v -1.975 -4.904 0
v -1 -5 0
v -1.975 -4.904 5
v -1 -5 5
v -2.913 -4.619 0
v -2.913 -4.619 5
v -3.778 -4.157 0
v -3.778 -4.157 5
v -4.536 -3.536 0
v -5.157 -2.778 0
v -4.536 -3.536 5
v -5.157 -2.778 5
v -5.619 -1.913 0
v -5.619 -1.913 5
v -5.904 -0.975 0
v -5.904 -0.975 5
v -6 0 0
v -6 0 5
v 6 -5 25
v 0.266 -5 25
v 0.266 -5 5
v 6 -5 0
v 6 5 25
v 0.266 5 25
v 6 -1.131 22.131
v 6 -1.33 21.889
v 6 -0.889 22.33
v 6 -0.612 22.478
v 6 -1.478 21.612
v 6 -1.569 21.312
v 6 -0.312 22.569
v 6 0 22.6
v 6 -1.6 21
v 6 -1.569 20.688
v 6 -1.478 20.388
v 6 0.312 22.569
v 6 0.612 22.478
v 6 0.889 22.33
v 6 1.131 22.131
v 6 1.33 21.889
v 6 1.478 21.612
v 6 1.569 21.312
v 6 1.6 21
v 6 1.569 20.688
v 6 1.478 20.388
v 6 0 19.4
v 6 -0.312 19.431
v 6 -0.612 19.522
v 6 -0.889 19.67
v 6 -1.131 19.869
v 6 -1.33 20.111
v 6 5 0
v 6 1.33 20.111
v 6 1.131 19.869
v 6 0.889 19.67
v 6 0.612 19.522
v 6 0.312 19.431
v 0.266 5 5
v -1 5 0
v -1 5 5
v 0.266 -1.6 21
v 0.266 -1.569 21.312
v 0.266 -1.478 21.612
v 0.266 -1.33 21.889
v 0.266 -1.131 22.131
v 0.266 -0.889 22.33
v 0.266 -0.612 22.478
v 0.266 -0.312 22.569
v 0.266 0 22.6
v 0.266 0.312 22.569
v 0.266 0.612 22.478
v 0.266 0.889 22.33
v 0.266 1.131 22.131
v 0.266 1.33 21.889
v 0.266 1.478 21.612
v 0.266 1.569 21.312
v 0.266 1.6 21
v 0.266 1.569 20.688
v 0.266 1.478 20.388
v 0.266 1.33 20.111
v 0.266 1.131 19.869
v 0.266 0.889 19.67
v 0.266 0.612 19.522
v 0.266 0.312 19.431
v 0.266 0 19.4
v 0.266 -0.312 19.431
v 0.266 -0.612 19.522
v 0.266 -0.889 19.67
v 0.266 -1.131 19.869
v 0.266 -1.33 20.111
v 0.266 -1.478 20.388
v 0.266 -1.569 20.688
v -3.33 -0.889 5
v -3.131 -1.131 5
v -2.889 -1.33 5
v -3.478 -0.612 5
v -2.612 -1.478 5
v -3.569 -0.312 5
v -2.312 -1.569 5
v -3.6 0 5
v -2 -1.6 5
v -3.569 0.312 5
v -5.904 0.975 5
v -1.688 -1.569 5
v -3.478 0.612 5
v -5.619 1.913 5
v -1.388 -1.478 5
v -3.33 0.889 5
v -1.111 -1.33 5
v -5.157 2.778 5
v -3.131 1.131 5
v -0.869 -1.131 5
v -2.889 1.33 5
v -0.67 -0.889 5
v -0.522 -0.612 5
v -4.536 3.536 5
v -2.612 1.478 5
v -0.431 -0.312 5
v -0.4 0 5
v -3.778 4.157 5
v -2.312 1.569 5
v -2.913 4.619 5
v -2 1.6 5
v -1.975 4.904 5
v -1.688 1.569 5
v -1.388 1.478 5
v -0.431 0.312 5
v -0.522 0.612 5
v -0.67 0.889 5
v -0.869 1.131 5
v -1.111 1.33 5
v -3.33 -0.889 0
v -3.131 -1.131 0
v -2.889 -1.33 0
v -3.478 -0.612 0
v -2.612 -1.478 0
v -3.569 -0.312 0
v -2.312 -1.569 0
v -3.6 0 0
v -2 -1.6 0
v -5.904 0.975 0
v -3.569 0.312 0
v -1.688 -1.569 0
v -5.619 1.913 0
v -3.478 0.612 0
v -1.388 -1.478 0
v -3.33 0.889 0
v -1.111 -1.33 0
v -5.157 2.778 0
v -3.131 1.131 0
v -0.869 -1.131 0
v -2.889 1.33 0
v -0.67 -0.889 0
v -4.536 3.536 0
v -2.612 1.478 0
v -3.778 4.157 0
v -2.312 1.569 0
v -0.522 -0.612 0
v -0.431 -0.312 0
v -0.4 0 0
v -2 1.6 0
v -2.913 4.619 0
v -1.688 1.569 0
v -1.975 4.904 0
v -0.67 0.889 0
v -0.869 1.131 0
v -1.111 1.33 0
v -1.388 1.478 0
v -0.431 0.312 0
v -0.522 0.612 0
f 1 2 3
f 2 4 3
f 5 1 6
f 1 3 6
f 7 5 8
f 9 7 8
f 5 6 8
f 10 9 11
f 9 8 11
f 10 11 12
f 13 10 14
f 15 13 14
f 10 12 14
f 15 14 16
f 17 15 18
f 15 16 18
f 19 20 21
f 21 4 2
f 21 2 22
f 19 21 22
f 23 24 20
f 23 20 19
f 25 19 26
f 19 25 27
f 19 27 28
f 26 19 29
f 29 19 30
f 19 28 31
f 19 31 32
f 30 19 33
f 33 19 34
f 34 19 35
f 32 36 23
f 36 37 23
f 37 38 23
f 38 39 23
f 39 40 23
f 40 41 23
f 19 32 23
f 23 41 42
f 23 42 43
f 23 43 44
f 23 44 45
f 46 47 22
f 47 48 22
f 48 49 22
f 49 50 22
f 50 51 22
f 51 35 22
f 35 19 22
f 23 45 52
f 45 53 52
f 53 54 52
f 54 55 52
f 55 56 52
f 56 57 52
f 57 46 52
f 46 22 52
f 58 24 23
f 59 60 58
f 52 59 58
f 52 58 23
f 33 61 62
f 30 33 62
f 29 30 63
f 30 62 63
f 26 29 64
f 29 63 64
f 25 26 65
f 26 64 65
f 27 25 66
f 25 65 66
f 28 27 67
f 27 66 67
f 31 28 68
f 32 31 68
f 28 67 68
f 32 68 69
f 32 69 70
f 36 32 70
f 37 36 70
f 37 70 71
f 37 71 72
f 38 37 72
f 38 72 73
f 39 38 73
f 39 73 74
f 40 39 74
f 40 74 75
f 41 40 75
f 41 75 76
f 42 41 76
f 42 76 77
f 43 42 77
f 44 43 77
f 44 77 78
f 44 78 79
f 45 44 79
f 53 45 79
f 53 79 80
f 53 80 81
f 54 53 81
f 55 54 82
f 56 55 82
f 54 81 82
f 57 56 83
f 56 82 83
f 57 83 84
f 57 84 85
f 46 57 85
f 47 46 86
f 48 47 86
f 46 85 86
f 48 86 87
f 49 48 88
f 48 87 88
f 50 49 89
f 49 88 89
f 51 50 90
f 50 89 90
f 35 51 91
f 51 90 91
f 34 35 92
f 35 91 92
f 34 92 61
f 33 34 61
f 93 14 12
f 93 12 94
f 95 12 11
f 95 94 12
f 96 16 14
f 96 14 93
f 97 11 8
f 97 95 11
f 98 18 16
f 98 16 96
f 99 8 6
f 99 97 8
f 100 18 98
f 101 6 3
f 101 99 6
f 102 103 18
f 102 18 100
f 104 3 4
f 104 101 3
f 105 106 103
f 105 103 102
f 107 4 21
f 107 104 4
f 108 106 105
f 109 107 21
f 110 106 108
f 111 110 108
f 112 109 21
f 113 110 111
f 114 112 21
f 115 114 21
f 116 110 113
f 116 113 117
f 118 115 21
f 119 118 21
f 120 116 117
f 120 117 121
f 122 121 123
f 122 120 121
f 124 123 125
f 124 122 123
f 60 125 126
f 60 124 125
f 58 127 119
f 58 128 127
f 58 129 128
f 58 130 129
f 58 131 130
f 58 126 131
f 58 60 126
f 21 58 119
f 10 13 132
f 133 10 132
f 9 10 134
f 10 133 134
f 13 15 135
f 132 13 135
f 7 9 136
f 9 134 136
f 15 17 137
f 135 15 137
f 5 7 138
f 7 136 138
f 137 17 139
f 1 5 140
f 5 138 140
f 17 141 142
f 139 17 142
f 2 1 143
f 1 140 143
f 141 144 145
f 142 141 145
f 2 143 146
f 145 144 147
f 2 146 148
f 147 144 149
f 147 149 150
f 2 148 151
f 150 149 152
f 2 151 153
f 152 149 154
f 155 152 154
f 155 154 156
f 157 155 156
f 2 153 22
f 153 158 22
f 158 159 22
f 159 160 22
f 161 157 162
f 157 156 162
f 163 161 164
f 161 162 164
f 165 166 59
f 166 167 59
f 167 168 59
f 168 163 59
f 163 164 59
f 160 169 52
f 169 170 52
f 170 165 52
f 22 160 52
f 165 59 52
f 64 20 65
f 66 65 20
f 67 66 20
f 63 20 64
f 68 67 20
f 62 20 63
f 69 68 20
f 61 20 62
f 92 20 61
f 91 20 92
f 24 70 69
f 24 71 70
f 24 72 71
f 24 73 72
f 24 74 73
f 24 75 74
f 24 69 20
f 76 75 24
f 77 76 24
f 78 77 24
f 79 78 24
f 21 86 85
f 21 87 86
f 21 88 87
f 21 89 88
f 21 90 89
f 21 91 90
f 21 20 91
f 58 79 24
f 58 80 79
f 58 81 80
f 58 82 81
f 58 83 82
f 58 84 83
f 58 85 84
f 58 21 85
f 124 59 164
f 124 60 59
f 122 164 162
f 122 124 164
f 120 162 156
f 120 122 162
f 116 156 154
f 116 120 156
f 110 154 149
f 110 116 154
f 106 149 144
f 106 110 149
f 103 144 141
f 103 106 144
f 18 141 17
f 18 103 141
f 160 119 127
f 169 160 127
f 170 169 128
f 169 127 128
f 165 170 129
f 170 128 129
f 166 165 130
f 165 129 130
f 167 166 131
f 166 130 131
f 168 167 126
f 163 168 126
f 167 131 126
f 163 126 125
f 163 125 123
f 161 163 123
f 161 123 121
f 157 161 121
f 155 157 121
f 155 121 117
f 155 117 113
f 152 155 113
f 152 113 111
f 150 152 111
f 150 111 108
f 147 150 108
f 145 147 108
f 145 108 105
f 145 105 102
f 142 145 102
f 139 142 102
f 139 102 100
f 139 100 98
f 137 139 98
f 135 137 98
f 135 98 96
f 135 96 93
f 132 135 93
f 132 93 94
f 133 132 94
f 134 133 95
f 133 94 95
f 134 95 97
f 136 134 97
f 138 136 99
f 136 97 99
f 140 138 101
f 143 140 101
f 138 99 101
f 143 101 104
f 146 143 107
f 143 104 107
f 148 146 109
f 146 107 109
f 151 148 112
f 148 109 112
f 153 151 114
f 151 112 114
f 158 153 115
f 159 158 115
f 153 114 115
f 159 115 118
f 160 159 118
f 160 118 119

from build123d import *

# Parameters (mm, degrees)
F0_W     = 12
F0_H     = 10
F1_DEPTH = 5
F2_W     = 5.7338950146
F2_H     = 10
F3_DEPTH = 20
F4_R     = 1.6
F5_DEPTH = 10
F6_R     = 1.6
F7_DEPTH = 10
F8_R     = 4.99999


# Not quite as in the source:
# - a fillet or chamfer is up to 0.001 mm smaller than in the source, because OpenCascade refuses the exact size


with BuildPart() as f1:
    # F0 (on Top) → F1 (new body)
    with BuildSketch(Plane.XY):
        Rectangle(F0_W, F0_H)
    extrude(amount=F1_DEPTH)

    # F2 (on face) → F3 (join)
    with BuildSketch(Plane.XY.offset(5)):
        with Locations((3.1330524927, 0)):
            Rectangle(F2_W, F2_H)
    extrude(amount=F3_DEPTH)

    # F4 (on face) → F5 (cut)
    with BuildSketch(Plane(origin=(0.2661049854, 0, 0), x_dir=(0, -1, 0), z_dir=(-1, 0, 0))):
        with Locations((0, 21)):
            Circle(F4_R)
    extrude(amount=-F5_DEPTH, mode=Mode.SUBTRACT)

    # F6 (on face) → F7 (cut)
    with BuildSketch(Plane.XY.offset(5)):
        with Locations((-2, 0)):
            Circle(F6_R)
    extrude(amount=-F7_DEPTH, mode=Mode.SUBTRACT)

    # F8 (radius 5 in the source; OpenCascade refuses exactly that, so slightly less here)
    f8_edges = [f1.edges().sort_by_distance(p)[0] for p in [
        (-6, -5, 2.5),
        (-6, 5, 2.5),
    ]]
    fillet(f8_edges, radius=F8_R)


solid = f1.part
